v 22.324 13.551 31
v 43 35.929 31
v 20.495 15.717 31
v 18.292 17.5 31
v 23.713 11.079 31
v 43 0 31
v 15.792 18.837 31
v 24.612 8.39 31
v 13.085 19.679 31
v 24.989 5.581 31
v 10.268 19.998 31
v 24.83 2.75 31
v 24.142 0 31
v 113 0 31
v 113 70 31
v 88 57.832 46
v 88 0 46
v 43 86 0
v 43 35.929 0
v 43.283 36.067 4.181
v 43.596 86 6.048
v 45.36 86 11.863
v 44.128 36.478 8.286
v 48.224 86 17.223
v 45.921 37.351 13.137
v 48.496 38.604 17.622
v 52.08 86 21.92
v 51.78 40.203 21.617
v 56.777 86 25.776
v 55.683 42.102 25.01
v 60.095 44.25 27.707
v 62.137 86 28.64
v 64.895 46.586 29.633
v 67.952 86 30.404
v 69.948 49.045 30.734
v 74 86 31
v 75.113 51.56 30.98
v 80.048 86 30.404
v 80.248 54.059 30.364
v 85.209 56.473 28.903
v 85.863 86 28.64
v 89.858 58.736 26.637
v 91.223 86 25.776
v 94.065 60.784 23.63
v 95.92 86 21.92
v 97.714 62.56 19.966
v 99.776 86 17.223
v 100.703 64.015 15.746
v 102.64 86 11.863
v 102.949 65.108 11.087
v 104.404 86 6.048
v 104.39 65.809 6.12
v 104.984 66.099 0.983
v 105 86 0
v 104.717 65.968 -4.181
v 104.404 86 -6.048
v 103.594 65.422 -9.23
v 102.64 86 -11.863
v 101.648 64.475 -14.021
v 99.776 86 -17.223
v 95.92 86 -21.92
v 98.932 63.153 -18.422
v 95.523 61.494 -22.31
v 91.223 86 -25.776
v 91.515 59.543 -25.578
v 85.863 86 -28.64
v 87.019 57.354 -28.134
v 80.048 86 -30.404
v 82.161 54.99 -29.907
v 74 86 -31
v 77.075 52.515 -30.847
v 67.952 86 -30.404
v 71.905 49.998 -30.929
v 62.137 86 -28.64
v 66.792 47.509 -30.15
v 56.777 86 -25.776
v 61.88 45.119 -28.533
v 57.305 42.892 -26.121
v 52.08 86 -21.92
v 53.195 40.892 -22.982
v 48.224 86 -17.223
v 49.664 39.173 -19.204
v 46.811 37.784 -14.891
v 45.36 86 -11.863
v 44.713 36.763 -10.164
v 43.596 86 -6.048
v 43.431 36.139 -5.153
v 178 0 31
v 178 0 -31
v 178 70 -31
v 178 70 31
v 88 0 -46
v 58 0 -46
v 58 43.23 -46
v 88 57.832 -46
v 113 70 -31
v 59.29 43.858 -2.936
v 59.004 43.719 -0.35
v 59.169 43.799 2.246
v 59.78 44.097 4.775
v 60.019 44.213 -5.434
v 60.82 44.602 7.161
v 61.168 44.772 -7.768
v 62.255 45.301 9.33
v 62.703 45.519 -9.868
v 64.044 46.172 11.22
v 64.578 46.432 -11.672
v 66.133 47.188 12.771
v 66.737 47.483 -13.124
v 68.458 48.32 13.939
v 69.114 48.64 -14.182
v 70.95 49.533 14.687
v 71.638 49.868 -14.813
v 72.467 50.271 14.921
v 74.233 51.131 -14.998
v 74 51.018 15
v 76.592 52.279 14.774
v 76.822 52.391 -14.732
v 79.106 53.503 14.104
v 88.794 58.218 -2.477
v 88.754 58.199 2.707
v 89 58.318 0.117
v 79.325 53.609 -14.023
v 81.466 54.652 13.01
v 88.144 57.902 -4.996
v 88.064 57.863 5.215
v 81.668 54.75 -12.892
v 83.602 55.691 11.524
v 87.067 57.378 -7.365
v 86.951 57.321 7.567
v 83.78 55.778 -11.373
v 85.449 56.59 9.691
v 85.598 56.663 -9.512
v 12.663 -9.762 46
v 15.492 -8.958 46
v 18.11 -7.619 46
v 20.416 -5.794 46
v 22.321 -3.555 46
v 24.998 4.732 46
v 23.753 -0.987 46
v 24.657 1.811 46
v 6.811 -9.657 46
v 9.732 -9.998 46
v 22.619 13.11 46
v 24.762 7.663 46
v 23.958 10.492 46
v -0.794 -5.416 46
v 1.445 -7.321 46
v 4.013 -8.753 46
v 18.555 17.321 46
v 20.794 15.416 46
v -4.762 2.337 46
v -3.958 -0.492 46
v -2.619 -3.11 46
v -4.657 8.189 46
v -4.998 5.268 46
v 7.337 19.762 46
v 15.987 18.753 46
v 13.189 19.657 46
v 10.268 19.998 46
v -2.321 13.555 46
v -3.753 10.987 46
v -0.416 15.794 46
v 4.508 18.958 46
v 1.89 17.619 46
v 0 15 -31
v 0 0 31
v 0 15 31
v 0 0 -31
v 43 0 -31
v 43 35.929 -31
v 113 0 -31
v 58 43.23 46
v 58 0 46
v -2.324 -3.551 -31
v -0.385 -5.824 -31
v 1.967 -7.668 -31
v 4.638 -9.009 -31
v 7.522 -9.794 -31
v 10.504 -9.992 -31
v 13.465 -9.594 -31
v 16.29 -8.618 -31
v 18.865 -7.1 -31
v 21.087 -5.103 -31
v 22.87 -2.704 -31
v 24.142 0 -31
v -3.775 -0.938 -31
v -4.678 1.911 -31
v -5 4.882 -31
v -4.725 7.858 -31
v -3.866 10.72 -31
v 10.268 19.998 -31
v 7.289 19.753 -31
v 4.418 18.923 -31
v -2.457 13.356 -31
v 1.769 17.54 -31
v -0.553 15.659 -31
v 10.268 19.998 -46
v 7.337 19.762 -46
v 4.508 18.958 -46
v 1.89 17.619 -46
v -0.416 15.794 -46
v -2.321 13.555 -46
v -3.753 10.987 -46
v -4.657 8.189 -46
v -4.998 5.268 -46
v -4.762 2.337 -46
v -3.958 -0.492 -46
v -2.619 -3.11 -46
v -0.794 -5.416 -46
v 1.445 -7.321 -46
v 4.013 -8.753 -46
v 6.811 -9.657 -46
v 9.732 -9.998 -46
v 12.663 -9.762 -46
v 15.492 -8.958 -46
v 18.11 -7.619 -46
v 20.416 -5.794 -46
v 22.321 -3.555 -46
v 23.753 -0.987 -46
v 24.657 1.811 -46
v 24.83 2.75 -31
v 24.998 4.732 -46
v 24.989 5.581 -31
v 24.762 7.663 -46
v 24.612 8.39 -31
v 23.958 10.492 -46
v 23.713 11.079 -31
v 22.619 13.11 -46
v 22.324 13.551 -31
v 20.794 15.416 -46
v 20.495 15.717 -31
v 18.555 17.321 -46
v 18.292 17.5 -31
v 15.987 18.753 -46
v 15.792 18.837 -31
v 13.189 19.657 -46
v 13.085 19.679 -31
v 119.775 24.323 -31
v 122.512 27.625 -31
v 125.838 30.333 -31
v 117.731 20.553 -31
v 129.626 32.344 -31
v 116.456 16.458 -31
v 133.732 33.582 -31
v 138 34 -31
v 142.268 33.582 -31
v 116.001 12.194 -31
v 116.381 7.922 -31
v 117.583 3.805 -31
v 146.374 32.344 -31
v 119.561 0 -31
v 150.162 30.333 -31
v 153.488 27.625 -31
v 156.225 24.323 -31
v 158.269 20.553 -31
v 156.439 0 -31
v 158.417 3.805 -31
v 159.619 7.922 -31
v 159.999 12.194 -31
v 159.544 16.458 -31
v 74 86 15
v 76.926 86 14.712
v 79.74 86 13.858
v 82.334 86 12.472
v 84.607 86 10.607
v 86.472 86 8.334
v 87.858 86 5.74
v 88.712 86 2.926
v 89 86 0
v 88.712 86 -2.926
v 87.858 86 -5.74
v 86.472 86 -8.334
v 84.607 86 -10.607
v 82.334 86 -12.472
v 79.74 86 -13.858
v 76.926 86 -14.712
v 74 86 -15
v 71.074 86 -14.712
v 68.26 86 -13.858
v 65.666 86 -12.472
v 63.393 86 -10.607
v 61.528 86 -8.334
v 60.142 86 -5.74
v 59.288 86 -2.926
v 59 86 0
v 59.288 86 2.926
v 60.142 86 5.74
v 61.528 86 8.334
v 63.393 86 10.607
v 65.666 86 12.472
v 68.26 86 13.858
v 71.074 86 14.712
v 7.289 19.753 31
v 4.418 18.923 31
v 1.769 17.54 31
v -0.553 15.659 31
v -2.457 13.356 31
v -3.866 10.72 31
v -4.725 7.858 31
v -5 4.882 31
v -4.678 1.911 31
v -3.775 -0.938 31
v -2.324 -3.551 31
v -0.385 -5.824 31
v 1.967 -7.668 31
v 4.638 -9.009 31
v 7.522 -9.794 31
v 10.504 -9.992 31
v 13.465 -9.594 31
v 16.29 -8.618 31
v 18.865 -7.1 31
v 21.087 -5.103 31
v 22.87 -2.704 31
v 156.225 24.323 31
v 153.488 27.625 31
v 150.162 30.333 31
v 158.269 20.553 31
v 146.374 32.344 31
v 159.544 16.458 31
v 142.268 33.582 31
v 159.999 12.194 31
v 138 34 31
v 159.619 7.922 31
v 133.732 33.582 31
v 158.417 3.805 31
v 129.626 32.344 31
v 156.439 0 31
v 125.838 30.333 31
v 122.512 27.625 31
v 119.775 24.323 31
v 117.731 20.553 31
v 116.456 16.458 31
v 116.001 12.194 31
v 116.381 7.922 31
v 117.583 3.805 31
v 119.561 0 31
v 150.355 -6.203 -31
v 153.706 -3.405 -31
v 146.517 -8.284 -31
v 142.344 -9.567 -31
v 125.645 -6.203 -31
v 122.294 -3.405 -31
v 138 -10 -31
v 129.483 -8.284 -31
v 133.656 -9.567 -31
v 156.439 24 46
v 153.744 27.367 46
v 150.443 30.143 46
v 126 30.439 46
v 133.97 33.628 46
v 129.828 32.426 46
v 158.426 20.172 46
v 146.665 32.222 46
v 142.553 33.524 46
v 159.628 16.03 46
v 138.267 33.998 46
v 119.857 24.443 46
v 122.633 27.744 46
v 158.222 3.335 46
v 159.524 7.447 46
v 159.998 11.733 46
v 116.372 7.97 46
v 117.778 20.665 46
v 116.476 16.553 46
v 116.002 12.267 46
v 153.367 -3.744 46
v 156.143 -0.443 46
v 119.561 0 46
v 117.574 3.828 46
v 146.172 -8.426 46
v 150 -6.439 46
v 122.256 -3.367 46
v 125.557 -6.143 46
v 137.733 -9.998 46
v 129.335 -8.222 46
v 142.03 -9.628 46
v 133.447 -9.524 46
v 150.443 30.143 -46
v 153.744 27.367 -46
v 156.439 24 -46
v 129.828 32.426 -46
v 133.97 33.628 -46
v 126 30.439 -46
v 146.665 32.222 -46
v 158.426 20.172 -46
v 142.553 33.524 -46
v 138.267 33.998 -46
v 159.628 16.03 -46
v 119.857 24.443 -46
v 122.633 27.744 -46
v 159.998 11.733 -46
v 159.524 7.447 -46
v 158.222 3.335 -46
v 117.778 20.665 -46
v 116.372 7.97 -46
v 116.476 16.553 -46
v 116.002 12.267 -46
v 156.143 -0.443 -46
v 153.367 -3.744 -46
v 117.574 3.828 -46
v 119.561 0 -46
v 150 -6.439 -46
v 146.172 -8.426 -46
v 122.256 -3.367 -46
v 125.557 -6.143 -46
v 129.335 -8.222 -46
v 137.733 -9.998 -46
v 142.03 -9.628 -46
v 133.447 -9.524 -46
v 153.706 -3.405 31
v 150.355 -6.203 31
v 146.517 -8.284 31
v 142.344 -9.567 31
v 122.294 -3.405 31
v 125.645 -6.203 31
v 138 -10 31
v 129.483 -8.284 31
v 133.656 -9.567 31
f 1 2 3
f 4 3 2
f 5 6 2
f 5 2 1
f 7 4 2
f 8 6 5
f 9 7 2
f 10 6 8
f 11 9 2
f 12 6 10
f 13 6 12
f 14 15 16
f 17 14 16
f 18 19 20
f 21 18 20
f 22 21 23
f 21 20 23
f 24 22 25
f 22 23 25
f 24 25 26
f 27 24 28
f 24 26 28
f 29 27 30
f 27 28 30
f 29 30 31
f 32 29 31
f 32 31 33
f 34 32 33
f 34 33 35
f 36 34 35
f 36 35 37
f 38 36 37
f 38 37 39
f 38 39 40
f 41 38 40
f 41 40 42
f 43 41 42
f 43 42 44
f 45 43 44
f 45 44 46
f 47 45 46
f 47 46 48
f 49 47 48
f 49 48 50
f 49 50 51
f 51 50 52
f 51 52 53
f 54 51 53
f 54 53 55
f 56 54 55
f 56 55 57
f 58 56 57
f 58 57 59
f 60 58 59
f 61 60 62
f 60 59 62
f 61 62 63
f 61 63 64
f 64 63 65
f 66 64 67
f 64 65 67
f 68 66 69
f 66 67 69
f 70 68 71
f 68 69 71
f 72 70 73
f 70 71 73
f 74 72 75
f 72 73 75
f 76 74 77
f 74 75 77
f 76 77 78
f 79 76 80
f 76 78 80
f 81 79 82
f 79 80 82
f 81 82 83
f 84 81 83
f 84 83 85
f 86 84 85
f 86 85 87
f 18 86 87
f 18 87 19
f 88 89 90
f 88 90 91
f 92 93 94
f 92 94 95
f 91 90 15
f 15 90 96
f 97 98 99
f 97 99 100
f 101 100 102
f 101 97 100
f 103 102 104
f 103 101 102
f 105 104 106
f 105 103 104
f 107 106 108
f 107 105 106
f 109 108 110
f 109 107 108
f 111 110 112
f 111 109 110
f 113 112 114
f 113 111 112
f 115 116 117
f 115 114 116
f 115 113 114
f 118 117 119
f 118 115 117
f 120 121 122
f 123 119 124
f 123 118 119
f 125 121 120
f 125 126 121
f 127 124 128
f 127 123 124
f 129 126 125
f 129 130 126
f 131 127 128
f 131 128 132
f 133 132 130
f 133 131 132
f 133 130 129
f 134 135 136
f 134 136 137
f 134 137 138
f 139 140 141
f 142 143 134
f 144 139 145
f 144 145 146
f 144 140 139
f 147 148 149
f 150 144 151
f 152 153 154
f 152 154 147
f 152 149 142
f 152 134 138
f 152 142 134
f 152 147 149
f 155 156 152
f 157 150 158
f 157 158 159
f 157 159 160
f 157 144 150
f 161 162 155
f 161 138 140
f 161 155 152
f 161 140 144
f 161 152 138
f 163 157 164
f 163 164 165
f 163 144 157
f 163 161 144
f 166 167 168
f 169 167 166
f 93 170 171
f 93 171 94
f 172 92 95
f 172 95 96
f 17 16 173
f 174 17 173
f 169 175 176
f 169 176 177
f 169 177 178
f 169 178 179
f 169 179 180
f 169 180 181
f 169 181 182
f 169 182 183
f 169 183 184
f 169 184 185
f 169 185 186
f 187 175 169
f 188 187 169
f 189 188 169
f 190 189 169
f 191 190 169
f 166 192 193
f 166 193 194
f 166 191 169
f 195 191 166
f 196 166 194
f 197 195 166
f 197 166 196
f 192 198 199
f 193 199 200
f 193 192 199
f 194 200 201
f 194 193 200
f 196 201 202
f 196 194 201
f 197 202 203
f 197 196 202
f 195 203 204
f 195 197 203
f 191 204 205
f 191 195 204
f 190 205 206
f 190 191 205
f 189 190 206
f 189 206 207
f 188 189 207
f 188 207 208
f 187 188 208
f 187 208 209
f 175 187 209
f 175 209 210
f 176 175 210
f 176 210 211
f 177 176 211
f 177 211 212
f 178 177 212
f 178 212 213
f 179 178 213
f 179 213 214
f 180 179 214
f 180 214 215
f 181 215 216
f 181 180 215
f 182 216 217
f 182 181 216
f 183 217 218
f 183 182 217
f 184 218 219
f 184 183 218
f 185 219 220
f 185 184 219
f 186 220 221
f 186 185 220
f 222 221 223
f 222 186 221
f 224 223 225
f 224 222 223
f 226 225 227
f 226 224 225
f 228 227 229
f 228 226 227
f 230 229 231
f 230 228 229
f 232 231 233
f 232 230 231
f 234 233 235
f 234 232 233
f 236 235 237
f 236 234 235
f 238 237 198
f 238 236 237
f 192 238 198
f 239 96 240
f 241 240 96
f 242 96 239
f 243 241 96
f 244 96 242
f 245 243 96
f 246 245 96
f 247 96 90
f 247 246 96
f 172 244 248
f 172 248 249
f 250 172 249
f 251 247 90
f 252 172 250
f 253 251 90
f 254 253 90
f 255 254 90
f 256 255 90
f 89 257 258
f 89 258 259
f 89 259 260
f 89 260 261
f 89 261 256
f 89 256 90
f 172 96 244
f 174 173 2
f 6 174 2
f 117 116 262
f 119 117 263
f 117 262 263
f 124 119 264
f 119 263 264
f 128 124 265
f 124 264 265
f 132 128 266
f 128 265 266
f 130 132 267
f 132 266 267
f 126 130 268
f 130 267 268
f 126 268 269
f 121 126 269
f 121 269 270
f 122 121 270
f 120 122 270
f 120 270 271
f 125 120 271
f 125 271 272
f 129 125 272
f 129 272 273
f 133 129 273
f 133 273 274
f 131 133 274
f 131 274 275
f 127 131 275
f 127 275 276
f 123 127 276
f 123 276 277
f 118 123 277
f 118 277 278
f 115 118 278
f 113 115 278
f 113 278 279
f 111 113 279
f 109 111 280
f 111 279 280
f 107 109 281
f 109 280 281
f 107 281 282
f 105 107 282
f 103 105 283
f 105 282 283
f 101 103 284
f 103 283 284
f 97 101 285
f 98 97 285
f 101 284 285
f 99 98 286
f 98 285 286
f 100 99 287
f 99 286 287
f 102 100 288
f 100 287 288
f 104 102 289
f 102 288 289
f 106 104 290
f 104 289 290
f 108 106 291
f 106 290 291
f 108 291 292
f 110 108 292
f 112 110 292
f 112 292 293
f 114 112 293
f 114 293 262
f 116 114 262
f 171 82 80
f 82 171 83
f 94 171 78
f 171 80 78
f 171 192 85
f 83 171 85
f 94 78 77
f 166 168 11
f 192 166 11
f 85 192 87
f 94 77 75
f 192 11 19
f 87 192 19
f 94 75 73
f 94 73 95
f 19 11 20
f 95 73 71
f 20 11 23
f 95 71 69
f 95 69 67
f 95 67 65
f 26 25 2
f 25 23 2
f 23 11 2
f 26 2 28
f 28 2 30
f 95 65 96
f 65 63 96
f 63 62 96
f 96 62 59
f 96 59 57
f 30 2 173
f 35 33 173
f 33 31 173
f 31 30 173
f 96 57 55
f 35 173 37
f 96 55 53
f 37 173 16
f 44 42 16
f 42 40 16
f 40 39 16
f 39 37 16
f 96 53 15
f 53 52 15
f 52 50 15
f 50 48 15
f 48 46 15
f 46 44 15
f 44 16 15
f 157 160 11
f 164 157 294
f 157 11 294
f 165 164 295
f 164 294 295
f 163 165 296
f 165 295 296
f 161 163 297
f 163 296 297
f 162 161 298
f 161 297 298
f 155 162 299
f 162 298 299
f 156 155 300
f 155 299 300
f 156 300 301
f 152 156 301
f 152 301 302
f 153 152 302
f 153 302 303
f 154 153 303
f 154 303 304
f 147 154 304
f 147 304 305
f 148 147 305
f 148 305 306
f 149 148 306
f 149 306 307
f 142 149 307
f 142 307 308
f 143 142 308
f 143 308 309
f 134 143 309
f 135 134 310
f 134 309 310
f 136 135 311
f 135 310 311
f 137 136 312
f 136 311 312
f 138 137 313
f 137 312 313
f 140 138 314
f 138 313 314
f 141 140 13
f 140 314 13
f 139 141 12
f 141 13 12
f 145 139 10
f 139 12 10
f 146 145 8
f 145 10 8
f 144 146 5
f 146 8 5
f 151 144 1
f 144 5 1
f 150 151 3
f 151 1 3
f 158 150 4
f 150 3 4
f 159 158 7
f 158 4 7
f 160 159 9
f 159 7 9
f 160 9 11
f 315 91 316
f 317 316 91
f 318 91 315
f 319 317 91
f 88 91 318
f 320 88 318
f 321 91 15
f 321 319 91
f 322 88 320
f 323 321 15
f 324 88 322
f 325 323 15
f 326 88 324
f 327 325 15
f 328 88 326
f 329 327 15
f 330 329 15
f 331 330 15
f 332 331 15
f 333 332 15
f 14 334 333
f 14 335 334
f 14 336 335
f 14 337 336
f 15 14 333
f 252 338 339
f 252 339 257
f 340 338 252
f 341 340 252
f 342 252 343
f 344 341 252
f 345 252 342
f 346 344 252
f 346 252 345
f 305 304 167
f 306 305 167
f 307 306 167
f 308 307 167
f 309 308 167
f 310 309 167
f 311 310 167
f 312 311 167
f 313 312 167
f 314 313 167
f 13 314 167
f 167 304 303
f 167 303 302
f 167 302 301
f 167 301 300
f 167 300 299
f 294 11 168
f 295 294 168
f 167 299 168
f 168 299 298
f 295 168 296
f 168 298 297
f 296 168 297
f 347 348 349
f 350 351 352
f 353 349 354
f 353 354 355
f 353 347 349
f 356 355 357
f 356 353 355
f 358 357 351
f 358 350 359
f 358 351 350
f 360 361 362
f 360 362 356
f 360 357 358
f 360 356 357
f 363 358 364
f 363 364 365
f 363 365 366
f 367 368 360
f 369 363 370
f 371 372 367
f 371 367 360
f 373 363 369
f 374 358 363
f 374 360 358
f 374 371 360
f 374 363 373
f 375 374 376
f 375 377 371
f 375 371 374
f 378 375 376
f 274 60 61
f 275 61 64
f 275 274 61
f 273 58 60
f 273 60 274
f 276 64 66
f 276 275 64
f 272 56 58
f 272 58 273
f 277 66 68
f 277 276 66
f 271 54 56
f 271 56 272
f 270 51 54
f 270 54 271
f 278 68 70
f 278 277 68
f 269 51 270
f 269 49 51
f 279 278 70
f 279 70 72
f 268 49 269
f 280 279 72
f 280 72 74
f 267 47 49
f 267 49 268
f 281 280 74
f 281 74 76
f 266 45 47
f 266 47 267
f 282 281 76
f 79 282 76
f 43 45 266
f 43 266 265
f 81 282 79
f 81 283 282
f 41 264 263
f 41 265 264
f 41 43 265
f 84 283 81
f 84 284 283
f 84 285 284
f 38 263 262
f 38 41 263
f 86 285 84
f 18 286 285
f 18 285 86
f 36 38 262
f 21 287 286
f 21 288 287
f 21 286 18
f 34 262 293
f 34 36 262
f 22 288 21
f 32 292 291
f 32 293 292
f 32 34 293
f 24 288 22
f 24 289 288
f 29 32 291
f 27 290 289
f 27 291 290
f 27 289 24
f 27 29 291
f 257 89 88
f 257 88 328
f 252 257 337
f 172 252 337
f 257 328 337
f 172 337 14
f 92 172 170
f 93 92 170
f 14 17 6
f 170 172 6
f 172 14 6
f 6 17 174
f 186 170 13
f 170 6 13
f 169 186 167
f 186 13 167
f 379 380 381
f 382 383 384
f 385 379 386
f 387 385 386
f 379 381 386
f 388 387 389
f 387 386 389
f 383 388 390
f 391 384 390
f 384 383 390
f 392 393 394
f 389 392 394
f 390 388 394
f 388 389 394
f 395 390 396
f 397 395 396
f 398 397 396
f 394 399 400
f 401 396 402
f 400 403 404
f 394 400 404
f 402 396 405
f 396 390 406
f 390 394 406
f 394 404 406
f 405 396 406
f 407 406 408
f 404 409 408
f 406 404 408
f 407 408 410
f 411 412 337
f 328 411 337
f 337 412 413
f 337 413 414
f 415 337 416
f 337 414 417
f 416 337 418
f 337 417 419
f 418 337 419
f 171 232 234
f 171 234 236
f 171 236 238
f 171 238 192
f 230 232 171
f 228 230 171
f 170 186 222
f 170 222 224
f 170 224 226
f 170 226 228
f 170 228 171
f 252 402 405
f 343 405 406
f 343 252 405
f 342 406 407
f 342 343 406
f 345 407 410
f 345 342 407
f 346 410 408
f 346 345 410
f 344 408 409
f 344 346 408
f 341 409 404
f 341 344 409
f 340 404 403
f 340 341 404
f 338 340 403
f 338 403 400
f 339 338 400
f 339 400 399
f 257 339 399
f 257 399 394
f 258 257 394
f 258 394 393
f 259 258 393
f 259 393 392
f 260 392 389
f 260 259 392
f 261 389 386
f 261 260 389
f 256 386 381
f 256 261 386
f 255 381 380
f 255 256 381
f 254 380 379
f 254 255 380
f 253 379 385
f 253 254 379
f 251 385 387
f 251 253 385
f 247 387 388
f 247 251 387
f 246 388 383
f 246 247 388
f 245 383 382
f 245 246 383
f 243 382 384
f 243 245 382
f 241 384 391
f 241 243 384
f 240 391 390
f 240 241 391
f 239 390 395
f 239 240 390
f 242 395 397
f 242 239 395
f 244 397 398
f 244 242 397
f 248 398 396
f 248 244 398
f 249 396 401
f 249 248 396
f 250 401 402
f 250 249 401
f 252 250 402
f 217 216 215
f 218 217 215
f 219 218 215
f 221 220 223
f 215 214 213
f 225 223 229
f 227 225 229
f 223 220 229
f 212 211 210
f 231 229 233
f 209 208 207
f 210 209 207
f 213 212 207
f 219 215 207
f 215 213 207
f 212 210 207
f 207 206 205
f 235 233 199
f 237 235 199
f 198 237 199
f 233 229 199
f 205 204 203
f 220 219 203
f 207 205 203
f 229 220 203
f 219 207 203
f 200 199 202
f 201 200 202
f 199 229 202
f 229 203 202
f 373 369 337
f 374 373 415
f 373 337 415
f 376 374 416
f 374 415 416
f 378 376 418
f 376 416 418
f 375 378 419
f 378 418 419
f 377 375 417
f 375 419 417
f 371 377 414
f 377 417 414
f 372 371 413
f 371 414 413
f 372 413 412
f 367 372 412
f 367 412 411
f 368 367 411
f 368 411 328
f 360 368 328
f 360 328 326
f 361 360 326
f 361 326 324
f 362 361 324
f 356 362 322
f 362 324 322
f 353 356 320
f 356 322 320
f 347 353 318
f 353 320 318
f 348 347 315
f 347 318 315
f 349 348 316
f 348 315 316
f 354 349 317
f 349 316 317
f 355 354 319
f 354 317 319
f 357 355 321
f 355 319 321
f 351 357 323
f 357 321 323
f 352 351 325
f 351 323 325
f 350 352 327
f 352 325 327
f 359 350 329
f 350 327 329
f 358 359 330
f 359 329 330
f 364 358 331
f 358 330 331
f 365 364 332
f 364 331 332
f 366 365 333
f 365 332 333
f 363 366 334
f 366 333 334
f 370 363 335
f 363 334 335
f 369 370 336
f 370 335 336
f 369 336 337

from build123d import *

# Parameters (mm, degrees)
EXTRUDE1_DEPTH      = 70
EXTRUDE2_DEPTH      = 70
EXTRUDE2_DEPTH_BACK = 90
SKETCH3_R           = 31
EXTRUDE3_DEPTH      = 86
EXTRUDE4_REACH      = 88
SKETCH4_R           = 15
SKETCH5_R           = 15
SKETCH5_R_2         = 22
EXTRUDE5_DEPTH      = 15


with BuildPart() as part:
    # Sketch1 → Extrude1 (new body)
    with BuildSketch(Plane(origin=(0, 0, 0), x_dir=(1, 0, 0), z_dir=(0, 1, 0))):
        Polygon((178, 31), (178, -31), (113, -31), (88, -46), (58, -46), (43, -31), (0, -31), (0, 31), (43, 31), (58, 46), (88, 46), (113, 31), align=None)
    extrude(amount=EXTRUDE1_DEPTH)

    # Sketch2 → Extrude2 (cut, two sides)
    with BuildSketch(Plane.XY.offset(31)) as extrude2_sk:
        Polygon((113, 70), (0, 70), (0, 15), align=None)
    extrude(amount=EXTRUDE2_DEPTH, mode=Mode.SUBTRACT)
    extrude(extrude2_sk.sketch, amount=-EXTRUDE2_DEPTH_BACK, mode=Mode.SUBTRACT)

    # Sketch3 → Extrude3 (add)
    with BuildSketch(Plane(origin=(0, 0, 0), x_dir=(1, 0, 0), z_dir=(0, 1, 0))):
        with Locations(Location((74, 0, 0), (0, 0, 180))):  # turned: the seam where the file's is
            Circle(SKETCH3_R)
    extrude(amount=EXTRUDE3_DEPTH)

    # Extrude4: up to this plane
    extrude4_end = Plane(origin=(113, 70, 101), z_dir=(-0.43763961, 0.899150472, 0))
    # Sketch4 → Extrude4 (cut, up to the surface)
    with BuildSketch(Plane(origin=(0, 86, 0), x_dir=(1, 0, 0), z_dir=(0, 1, 0)), mode=Mode.PRIVATE) as extrude4_sk1:
        with Locations(Location((74, 0, 0), (0, 0, 270))):  # turned: the seam where the file's is
            Circle(SKETCH4_R)
    extrude4_tool1 = split(extrude(extrude4_sk1.sketch, amount=-EXTRUDE4_REACH, mode=Mode.PRIVATE), bisect_by=extrude4_end, keep=Keep.BOTH, mode=Mode.PRIVATE)
    add(extrude4_tool1.solids().sort_by_distance((74, 86, 0))[0], mode=Mode.SUBTRACT)

    # Sketch5 → Extrude5 (add)
    with BuildSketch(Plane.XY.offset(31)):
        with Locations(Location((10, 5, 0), (0, 0, 88.976968381))):  # turned: the seam where the file's is
            Circle(SKETCH5_R)
        with Locations(Location((138, 12, 0), (0, 0, 213.055731151))):  # turned: the seam where the file's is
            Circle(SKETCH5_R_2)
    extrude5 = extrude(amount=EXTRUDE5_DEPTH)

    # Mirror1: Extrude5 across plane
    add(extrude5.mirror(Plane.XY))


solid = part.part
